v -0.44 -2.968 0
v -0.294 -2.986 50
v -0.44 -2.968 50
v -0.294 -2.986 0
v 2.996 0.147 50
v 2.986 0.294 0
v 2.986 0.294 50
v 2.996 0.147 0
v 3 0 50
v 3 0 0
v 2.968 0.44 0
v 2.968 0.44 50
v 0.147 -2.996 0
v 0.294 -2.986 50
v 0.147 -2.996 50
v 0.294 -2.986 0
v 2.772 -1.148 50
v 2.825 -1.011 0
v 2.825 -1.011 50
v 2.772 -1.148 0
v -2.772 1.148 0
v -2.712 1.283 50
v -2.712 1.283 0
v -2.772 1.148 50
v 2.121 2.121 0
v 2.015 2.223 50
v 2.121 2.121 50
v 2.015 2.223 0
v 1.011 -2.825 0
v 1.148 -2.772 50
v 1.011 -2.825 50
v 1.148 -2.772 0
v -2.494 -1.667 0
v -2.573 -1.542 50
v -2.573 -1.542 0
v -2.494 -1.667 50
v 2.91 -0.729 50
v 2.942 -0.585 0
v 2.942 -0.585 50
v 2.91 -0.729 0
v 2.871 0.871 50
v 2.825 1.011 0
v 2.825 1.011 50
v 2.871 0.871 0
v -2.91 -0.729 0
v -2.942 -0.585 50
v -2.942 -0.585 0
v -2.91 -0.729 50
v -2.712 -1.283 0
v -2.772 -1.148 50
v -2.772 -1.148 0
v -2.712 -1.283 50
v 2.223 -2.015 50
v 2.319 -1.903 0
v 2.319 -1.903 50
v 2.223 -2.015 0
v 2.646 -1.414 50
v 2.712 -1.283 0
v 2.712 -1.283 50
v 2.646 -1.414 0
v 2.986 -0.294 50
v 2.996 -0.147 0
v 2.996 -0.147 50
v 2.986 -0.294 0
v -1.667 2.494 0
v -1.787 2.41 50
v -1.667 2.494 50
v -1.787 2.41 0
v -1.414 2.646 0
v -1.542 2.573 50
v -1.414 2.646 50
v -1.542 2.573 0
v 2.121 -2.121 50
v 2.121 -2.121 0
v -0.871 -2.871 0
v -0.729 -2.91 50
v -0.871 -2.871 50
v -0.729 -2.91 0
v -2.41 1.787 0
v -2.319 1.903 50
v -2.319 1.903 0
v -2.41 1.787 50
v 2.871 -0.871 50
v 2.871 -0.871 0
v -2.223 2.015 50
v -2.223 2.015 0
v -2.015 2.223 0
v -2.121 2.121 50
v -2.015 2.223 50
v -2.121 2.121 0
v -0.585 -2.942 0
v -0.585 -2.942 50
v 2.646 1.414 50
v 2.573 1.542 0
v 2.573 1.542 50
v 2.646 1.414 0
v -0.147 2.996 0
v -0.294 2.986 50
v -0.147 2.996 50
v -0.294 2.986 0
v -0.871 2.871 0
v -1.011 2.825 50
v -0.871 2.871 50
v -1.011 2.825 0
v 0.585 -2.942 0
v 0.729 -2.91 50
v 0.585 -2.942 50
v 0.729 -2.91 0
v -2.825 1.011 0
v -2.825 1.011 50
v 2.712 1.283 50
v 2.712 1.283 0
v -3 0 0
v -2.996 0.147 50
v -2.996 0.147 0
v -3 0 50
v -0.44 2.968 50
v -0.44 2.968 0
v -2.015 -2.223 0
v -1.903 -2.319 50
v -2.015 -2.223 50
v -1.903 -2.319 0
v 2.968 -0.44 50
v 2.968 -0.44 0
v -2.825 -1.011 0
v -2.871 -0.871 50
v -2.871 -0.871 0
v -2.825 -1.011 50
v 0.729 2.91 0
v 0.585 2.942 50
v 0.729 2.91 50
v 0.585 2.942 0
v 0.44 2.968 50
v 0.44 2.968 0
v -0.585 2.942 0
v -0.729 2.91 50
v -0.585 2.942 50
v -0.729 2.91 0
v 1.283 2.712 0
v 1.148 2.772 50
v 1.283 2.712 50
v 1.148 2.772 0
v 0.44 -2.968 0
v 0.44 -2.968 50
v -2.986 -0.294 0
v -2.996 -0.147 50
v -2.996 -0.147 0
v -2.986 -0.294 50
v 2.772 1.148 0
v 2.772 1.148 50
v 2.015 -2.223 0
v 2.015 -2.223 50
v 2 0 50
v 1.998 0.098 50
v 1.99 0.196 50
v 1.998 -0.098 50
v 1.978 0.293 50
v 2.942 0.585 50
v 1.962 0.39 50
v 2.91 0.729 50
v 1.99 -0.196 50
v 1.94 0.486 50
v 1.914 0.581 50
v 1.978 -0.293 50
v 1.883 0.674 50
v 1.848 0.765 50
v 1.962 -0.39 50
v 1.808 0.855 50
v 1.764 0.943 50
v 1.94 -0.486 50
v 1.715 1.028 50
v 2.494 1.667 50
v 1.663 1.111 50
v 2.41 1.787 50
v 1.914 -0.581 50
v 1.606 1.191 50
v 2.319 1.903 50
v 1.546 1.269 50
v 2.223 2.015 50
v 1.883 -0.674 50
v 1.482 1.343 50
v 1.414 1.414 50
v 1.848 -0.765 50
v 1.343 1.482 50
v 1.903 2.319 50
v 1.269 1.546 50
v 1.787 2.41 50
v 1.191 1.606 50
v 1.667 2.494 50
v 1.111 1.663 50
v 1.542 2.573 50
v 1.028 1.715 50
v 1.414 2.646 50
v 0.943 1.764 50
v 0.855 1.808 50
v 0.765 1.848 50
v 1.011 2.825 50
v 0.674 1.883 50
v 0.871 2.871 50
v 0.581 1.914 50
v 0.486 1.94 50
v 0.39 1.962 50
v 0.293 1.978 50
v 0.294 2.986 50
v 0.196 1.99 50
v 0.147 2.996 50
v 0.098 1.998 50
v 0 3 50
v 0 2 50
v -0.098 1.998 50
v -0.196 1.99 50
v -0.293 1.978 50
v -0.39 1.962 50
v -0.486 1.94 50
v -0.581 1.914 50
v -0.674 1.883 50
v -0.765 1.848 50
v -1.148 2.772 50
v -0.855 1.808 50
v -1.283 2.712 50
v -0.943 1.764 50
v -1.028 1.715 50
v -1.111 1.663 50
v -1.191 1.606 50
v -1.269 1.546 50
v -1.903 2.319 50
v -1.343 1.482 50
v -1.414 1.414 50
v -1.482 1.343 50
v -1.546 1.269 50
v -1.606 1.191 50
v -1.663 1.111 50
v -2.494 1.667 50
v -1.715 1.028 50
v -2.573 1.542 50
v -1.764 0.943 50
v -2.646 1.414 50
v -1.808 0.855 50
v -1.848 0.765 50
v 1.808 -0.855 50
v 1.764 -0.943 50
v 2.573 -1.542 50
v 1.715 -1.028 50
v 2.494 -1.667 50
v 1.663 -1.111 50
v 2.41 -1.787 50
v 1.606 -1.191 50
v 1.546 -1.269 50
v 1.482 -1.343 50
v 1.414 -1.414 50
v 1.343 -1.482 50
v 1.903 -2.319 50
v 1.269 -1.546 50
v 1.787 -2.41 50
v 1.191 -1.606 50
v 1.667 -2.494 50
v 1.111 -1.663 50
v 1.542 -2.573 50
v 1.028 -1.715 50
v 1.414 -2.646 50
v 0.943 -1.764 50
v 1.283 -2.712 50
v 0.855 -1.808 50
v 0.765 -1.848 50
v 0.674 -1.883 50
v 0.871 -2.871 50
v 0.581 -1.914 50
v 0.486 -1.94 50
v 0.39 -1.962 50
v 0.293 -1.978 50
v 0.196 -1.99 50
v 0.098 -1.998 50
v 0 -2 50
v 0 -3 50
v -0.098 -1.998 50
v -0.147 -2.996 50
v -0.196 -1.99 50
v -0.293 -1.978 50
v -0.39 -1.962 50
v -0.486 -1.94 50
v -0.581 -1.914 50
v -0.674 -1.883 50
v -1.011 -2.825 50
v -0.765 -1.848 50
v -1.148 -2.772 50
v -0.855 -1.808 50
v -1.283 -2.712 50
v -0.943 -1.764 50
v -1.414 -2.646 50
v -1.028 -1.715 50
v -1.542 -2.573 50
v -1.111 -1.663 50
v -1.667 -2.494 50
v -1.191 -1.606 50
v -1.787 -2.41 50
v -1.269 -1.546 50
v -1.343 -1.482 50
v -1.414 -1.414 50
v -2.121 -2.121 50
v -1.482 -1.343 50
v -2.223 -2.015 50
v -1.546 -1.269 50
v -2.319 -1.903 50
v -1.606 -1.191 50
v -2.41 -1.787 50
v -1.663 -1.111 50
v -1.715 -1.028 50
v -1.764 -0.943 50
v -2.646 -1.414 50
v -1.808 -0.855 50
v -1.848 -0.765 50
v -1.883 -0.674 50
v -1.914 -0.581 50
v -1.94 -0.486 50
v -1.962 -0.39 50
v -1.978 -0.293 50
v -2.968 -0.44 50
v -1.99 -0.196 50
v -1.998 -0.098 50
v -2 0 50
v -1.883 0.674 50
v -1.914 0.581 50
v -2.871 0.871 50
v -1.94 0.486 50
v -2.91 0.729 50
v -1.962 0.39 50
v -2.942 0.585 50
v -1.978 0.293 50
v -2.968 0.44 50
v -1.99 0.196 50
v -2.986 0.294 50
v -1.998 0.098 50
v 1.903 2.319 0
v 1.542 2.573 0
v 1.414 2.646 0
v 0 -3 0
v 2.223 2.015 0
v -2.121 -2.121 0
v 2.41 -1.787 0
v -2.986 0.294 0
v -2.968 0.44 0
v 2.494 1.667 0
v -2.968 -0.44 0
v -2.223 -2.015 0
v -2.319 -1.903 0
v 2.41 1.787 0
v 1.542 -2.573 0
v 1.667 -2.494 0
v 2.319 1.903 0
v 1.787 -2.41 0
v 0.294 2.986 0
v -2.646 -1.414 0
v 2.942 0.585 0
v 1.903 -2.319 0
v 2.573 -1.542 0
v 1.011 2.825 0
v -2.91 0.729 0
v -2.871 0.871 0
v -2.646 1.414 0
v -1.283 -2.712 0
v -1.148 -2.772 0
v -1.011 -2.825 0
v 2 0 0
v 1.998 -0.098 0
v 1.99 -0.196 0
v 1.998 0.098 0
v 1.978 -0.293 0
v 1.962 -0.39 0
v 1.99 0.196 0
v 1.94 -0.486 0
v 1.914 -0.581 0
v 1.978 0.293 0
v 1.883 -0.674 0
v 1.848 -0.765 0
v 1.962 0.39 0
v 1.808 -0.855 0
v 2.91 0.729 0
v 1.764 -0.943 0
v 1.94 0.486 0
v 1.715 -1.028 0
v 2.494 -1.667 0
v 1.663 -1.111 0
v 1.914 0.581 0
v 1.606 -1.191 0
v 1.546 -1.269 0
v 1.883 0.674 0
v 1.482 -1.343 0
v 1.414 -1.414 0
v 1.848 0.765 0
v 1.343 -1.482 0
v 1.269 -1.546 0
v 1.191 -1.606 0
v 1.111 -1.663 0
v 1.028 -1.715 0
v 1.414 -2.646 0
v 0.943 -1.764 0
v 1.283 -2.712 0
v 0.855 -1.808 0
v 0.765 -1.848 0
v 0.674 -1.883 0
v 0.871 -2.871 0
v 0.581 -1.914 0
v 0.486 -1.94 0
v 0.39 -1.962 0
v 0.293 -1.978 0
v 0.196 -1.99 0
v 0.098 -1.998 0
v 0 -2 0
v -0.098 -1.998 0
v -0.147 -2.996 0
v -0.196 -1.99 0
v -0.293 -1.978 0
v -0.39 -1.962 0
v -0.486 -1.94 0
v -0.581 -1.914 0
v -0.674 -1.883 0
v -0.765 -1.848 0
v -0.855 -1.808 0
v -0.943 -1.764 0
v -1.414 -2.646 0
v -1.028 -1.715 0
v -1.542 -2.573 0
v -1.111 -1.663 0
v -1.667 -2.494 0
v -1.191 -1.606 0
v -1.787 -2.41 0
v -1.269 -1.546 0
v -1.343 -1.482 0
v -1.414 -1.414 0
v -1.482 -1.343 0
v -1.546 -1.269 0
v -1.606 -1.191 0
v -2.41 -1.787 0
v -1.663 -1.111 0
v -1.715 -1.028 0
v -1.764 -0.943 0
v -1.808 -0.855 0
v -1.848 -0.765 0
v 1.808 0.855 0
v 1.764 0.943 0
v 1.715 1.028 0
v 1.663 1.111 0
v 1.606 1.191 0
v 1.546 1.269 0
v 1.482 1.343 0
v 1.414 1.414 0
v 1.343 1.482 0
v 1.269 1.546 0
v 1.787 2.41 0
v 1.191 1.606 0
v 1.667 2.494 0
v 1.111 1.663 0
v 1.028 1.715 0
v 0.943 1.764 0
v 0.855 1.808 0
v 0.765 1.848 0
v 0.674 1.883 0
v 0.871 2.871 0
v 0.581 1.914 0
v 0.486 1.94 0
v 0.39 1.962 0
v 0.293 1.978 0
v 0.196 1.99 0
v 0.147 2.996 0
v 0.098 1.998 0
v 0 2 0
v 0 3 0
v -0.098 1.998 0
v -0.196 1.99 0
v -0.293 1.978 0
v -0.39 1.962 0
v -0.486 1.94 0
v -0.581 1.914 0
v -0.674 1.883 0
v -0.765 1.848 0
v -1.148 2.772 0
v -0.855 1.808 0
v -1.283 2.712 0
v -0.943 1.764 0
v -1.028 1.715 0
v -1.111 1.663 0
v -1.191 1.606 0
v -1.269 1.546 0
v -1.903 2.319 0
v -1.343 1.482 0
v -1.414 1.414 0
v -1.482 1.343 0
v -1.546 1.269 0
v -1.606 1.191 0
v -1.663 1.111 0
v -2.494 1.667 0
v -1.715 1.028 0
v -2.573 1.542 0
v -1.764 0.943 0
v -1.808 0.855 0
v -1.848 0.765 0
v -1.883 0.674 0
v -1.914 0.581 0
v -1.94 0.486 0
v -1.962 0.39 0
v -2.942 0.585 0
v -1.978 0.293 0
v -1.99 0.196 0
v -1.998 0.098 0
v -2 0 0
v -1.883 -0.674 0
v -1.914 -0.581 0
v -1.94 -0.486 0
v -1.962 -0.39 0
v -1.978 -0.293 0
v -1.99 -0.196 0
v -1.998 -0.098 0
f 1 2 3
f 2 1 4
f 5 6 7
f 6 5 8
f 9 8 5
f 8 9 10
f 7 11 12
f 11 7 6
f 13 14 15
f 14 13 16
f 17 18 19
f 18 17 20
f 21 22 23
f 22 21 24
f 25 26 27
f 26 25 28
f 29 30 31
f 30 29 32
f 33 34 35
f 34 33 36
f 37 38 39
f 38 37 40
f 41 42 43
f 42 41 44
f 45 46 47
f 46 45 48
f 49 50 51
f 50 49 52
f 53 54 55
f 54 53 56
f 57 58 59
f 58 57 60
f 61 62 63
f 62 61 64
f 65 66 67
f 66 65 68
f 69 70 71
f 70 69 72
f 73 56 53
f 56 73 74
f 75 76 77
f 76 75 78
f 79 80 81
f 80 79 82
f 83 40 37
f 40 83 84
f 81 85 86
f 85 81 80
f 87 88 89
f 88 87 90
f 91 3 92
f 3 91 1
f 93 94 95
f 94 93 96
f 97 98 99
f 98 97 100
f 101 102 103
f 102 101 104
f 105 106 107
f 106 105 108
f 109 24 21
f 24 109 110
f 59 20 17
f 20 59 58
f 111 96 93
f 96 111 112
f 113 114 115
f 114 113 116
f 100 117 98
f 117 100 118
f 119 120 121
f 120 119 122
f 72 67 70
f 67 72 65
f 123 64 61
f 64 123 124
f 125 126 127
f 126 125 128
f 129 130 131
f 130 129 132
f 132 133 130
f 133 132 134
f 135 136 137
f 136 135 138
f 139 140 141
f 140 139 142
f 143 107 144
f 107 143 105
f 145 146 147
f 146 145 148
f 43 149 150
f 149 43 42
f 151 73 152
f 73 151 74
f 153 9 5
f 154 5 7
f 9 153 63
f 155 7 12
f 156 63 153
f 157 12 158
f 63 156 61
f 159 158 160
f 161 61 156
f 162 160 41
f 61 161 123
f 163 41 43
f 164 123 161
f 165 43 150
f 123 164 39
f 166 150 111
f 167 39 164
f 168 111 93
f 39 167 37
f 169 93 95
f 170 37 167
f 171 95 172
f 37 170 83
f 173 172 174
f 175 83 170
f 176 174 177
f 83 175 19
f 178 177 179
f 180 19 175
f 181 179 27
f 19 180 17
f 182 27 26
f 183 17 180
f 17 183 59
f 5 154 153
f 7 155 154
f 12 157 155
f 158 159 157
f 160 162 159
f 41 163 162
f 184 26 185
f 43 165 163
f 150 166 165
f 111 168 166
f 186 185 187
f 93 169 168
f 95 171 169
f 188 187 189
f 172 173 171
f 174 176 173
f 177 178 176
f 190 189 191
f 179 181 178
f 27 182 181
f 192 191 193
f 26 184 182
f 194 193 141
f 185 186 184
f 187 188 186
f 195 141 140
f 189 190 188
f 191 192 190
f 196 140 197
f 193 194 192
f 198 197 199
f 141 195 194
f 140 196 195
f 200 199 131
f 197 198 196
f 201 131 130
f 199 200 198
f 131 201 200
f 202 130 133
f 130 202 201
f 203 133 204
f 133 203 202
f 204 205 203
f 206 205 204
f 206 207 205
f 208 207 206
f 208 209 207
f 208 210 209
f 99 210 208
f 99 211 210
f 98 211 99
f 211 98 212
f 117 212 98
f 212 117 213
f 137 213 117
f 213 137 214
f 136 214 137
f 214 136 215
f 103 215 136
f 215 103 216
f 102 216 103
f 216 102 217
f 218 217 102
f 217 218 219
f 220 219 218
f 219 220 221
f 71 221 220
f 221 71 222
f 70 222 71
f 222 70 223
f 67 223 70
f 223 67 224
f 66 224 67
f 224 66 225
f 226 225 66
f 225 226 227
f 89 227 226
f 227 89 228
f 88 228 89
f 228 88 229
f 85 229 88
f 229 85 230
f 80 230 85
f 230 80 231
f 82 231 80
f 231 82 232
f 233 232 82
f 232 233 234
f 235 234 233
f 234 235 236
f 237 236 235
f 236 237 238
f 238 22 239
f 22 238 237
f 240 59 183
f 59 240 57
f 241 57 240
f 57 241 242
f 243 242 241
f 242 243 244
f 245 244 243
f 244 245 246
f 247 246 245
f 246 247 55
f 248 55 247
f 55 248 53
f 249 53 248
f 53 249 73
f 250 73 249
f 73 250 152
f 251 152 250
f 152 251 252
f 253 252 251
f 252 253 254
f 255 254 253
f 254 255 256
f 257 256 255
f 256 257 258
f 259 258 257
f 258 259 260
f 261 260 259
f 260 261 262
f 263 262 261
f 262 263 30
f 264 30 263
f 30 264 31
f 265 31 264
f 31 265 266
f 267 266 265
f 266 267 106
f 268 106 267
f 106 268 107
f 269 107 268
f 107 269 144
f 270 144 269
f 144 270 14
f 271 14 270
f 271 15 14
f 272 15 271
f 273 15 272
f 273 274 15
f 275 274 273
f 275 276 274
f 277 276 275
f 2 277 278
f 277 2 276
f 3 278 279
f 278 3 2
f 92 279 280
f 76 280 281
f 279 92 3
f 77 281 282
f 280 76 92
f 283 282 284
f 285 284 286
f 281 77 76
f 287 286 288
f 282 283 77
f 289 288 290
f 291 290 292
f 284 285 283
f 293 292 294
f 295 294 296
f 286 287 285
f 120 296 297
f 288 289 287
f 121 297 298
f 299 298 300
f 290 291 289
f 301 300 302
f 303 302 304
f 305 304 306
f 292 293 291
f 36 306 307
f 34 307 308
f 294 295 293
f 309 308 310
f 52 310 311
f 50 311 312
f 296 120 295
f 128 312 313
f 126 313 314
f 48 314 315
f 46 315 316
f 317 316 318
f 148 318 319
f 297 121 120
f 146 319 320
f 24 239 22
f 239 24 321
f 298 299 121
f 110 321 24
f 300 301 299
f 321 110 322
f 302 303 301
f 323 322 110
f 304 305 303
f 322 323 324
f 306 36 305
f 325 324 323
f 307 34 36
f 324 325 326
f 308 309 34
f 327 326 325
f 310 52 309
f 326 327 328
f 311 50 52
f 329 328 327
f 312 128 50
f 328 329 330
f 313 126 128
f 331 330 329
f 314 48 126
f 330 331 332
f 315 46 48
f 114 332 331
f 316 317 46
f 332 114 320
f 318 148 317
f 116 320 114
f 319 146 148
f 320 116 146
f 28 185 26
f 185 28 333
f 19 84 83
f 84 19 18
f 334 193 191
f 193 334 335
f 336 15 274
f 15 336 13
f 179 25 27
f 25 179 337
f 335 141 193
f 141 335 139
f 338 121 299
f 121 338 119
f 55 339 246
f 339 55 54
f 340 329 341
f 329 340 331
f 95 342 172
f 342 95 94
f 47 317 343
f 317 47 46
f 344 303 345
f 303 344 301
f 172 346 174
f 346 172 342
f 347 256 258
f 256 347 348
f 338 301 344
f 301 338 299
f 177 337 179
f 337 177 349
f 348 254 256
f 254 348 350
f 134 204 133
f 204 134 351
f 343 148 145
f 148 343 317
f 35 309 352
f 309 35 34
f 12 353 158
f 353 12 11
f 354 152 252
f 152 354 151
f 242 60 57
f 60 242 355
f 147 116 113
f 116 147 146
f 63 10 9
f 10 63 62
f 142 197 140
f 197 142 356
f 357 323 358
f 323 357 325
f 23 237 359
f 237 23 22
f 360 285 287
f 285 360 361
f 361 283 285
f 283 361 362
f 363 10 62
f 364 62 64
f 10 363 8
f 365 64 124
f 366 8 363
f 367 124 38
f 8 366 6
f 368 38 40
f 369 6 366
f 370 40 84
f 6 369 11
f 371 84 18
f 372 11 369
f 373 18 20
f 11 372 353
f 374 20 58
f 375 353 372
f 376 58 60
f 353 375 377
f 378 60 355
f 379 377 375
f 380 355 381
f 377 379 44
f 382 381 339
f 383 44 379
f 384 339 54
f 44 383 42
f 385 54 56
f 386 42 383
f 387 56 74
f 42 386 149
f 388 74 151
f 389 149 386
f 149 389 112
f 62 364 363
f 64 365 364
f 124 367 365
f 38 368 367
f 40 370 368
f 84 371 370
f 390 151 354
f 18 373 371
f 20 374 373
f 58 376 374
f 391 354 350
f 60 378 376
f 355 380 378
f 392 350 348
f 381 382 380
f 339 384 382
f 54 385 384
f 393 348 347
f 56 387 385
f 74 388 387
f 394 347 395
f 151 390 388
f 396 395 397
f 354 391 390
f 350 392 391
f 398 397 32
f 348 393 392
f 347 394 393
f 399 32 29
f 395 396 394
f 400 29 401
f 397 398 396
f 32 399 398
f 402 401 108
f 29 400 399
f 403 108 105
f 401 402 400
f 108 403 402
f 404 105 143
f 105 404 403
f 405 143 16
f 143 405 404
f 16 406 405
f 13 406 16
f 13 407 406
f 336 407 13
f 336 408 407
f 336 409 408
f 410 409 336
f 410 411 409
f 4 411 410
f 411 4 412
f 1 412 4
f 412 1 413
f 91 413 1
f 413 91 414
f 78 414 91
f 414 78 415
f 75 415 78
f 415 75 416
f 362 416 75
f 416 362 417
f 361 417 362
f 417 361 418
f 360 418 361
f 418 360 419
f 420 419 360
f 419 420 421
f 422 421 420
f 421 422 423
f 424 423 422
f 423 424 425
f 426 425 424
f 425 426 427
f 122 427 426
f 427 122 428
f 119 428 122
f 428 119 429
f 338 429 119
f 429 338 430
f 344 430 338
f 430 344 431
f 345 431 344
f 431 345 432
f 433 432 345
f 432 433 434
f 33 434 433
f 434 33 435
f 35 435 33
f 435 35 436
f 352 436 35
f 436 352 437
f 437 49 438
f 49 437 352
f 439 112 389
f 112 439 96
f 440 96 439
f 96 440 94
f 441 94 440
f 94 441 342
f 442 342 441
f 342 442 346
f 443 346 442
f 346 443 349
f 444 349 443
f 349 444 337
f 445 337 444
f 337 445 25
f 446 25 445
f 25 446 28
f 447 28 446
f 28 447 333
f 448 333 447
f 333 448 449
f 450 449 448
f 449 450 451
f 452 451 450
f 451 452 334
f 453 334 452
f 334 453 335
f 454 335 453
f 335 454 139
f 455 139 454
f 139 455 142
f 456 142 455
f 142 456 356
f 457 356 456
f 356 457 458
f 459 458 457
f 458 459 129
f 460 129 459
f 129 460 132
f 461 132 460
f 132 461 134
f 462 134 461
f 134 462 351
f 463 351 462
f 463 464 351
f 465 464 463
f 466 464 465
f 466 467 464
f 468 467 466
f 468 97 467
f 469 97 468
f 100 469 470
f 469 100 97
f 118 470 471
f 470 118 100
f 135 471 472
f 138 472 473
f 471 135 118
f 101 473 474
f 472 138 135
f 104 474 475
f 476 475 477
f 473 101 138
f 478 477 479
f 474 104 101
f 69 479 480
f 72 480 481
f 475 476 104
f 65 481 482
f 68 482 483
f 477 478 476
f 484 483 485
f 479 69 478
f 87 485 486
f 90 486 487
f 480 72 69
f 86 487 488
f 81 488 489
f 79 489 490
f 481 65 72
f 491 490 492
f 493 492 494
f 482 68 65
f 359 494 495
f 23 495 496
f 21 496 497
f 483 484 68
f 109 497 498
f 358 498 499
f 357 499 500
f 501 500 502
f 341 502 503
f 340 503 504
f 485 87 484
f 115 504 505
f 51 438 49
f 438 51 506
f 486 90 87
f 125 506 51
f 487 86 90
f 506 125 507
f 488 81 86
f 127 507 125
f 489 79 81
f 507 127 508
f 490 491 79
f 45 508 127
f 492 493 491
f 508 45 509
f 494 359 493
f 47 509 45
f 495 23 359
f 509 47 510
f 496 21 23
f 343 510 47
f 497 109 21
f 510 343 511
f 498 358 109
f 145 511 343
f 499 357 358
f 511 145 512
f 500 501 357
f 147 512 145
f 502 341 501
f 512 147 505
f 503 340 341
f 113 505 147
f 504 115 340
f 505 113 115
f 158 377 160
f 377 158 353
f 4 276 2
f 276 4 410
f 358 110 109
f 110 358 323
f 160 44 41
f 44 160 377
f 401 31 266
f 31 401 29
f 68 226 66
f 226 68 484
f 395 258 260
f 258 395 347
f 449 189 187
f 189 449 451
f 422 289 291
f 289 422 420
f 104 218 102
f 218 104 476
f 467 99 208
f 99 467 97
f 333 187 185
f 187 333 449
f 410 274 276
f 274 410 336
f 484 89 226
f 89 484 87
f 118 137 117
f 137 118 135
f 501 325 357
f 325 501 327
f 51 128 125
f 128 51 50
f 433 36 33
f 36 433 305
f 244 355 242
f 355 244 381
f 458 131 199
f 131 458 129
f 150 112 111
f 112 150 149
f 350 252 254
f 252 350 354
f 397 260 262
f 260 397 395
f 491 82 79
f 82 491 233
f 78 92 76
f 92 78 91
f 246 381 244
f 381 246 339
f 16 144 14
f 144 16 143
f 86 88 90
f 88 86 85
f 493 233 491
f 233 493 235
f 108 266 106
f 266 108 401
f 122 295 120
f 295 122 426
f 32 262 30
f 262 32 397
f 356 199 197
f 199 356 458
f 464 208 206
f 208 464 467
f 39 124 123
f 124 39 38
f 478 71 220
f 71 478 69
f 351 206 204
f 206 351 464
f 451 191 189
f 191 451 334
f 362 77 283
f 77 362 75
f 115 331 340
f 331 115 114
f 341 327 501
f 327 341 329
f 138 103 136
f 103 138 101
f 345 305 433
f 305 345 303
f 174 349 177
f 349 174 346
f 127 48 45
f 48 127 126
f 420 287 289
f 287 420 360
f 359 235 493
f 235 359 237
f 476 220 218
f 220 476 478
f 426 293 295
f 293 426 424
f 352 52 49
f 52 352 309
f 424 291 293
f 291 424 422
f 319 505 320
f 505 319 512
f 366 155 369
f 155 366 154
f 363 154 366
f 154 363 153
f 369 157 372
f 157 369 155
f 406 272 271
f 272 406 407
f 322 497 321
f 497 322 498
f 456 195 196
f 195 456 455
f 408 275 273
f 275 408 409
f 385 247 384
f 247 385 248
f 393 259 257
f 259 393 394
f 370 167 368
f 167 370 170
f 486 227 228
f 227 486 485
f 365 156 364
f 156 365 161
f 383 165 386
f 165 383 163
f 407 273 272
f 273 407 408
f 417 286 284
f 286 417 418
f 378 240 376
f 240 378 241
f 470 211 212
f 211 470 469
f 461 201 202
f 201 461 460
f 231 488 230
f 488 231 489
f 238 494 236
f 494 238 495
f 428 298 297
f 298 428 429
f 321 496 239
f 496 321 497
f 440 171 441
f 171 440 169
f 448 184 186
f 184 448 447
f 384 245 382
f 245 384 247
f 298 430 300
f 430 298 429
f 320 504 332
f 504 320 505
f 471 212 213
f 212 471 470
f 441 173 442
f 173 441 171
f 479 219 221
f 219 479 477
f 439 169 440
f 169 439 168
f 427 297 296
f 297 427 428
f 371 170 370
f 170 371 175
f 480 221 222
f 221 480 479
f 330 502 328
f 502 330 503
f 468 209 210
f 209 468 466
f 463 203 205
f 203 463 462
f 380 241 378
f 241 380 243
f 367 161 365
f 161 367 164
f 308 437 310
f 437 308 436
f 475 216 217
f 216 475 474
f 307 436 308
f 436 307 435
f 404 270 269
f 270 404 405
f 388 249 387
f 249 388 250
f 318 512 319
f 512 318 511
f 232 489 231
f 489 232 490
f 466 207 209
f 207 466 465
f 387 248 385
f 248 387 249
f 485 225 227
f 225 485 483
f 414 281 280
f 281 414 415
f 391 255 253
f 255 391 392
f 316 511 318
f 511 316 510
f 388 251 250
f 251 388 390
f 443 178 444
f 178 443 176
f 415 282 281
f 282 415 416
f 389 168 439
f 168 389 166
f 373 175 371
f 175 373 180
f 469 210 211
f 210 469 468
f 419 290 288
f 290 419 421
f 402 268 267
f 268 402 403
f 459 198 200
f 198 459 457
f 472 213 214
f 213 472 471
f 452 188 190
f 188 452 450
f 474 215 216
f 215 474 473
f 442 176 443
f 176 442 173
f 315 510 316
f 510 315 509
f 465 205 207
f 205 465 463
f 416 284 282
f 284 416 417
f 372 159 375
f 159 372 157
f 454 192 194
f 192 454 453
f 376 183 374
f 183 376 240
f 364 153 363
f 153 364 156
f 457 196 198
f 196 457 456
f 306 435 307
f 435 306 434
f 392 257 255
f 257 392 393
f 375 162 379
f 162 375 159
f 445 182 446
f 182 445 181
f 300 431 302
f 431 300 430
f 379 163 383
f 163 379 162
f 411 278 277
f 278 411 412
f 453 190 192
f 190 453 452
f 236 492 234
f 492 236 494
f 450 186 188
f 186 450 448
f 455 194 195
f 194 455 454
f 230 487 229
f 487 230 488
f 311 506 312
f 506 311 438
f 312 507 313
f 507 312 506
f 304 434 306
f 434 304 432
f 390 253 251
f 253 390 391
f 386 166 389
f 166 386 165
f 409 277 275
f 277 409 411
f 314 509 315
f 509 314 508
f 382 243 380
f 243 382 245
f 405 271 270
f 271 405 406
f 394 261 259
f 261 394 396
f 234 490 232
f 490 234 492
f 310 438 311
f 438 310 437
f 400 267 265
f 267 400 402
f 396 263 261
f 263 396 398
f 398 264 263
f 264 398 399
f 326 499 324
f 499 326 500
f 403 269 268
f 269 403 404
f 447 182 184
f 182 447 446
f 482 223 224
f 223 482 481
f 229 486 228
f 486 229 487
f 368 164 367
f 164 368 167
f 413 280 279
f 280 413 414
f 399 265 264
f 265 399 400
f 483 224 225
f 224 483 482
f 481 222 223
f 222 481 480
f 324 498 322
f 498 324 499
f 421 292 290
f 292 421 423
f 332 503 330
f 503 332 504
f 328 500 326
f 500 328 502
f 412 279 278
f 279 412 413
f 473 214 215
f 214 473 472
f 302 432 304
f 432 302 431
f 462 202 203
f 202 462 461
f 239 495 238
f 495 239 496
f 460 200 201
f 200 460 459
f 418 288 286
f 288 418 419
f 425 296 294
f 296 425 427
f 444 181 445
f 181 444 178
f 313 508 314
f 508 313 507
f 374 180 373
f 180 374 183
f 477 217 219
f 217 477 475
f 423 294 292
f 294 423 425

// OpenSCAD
$fn = 128;

// PTFE heatshrink sleeving (simple hollow tube model)
// Units: mm

// Parameters
length = 50;          // overall length
id_before = 4.0;      // inner diameter (assumed constant)
od_before = 6.0;      // outer diameter before shrink
shrink_ratio = 2.0;   // e.g., 2:1
shrink_factor = 0.85; // optional additional shrink (0..1), 1 = ideal ratio only

// Derived (approximate) post-shrink OD (kept >= ID)
od_after = max(id_before + 0.2, (od_before / shrink_ratio) * shrink_factor);

// Choose which state to render: "before" or "after"
state = "before"; // ["before","after"]

module sleeving(L=50, ID=4, OD=6) {
    difference() {
        cylinder(h=L, d=OD, center=false);
        translate([0,0,-0.1]) cylinder(h=L+0.2, d=ID, center=false);
    }
}

if (state == "before")
    sleeving(length, id_before, od_before);
else
    sleeving(length, id_before, od_after);
